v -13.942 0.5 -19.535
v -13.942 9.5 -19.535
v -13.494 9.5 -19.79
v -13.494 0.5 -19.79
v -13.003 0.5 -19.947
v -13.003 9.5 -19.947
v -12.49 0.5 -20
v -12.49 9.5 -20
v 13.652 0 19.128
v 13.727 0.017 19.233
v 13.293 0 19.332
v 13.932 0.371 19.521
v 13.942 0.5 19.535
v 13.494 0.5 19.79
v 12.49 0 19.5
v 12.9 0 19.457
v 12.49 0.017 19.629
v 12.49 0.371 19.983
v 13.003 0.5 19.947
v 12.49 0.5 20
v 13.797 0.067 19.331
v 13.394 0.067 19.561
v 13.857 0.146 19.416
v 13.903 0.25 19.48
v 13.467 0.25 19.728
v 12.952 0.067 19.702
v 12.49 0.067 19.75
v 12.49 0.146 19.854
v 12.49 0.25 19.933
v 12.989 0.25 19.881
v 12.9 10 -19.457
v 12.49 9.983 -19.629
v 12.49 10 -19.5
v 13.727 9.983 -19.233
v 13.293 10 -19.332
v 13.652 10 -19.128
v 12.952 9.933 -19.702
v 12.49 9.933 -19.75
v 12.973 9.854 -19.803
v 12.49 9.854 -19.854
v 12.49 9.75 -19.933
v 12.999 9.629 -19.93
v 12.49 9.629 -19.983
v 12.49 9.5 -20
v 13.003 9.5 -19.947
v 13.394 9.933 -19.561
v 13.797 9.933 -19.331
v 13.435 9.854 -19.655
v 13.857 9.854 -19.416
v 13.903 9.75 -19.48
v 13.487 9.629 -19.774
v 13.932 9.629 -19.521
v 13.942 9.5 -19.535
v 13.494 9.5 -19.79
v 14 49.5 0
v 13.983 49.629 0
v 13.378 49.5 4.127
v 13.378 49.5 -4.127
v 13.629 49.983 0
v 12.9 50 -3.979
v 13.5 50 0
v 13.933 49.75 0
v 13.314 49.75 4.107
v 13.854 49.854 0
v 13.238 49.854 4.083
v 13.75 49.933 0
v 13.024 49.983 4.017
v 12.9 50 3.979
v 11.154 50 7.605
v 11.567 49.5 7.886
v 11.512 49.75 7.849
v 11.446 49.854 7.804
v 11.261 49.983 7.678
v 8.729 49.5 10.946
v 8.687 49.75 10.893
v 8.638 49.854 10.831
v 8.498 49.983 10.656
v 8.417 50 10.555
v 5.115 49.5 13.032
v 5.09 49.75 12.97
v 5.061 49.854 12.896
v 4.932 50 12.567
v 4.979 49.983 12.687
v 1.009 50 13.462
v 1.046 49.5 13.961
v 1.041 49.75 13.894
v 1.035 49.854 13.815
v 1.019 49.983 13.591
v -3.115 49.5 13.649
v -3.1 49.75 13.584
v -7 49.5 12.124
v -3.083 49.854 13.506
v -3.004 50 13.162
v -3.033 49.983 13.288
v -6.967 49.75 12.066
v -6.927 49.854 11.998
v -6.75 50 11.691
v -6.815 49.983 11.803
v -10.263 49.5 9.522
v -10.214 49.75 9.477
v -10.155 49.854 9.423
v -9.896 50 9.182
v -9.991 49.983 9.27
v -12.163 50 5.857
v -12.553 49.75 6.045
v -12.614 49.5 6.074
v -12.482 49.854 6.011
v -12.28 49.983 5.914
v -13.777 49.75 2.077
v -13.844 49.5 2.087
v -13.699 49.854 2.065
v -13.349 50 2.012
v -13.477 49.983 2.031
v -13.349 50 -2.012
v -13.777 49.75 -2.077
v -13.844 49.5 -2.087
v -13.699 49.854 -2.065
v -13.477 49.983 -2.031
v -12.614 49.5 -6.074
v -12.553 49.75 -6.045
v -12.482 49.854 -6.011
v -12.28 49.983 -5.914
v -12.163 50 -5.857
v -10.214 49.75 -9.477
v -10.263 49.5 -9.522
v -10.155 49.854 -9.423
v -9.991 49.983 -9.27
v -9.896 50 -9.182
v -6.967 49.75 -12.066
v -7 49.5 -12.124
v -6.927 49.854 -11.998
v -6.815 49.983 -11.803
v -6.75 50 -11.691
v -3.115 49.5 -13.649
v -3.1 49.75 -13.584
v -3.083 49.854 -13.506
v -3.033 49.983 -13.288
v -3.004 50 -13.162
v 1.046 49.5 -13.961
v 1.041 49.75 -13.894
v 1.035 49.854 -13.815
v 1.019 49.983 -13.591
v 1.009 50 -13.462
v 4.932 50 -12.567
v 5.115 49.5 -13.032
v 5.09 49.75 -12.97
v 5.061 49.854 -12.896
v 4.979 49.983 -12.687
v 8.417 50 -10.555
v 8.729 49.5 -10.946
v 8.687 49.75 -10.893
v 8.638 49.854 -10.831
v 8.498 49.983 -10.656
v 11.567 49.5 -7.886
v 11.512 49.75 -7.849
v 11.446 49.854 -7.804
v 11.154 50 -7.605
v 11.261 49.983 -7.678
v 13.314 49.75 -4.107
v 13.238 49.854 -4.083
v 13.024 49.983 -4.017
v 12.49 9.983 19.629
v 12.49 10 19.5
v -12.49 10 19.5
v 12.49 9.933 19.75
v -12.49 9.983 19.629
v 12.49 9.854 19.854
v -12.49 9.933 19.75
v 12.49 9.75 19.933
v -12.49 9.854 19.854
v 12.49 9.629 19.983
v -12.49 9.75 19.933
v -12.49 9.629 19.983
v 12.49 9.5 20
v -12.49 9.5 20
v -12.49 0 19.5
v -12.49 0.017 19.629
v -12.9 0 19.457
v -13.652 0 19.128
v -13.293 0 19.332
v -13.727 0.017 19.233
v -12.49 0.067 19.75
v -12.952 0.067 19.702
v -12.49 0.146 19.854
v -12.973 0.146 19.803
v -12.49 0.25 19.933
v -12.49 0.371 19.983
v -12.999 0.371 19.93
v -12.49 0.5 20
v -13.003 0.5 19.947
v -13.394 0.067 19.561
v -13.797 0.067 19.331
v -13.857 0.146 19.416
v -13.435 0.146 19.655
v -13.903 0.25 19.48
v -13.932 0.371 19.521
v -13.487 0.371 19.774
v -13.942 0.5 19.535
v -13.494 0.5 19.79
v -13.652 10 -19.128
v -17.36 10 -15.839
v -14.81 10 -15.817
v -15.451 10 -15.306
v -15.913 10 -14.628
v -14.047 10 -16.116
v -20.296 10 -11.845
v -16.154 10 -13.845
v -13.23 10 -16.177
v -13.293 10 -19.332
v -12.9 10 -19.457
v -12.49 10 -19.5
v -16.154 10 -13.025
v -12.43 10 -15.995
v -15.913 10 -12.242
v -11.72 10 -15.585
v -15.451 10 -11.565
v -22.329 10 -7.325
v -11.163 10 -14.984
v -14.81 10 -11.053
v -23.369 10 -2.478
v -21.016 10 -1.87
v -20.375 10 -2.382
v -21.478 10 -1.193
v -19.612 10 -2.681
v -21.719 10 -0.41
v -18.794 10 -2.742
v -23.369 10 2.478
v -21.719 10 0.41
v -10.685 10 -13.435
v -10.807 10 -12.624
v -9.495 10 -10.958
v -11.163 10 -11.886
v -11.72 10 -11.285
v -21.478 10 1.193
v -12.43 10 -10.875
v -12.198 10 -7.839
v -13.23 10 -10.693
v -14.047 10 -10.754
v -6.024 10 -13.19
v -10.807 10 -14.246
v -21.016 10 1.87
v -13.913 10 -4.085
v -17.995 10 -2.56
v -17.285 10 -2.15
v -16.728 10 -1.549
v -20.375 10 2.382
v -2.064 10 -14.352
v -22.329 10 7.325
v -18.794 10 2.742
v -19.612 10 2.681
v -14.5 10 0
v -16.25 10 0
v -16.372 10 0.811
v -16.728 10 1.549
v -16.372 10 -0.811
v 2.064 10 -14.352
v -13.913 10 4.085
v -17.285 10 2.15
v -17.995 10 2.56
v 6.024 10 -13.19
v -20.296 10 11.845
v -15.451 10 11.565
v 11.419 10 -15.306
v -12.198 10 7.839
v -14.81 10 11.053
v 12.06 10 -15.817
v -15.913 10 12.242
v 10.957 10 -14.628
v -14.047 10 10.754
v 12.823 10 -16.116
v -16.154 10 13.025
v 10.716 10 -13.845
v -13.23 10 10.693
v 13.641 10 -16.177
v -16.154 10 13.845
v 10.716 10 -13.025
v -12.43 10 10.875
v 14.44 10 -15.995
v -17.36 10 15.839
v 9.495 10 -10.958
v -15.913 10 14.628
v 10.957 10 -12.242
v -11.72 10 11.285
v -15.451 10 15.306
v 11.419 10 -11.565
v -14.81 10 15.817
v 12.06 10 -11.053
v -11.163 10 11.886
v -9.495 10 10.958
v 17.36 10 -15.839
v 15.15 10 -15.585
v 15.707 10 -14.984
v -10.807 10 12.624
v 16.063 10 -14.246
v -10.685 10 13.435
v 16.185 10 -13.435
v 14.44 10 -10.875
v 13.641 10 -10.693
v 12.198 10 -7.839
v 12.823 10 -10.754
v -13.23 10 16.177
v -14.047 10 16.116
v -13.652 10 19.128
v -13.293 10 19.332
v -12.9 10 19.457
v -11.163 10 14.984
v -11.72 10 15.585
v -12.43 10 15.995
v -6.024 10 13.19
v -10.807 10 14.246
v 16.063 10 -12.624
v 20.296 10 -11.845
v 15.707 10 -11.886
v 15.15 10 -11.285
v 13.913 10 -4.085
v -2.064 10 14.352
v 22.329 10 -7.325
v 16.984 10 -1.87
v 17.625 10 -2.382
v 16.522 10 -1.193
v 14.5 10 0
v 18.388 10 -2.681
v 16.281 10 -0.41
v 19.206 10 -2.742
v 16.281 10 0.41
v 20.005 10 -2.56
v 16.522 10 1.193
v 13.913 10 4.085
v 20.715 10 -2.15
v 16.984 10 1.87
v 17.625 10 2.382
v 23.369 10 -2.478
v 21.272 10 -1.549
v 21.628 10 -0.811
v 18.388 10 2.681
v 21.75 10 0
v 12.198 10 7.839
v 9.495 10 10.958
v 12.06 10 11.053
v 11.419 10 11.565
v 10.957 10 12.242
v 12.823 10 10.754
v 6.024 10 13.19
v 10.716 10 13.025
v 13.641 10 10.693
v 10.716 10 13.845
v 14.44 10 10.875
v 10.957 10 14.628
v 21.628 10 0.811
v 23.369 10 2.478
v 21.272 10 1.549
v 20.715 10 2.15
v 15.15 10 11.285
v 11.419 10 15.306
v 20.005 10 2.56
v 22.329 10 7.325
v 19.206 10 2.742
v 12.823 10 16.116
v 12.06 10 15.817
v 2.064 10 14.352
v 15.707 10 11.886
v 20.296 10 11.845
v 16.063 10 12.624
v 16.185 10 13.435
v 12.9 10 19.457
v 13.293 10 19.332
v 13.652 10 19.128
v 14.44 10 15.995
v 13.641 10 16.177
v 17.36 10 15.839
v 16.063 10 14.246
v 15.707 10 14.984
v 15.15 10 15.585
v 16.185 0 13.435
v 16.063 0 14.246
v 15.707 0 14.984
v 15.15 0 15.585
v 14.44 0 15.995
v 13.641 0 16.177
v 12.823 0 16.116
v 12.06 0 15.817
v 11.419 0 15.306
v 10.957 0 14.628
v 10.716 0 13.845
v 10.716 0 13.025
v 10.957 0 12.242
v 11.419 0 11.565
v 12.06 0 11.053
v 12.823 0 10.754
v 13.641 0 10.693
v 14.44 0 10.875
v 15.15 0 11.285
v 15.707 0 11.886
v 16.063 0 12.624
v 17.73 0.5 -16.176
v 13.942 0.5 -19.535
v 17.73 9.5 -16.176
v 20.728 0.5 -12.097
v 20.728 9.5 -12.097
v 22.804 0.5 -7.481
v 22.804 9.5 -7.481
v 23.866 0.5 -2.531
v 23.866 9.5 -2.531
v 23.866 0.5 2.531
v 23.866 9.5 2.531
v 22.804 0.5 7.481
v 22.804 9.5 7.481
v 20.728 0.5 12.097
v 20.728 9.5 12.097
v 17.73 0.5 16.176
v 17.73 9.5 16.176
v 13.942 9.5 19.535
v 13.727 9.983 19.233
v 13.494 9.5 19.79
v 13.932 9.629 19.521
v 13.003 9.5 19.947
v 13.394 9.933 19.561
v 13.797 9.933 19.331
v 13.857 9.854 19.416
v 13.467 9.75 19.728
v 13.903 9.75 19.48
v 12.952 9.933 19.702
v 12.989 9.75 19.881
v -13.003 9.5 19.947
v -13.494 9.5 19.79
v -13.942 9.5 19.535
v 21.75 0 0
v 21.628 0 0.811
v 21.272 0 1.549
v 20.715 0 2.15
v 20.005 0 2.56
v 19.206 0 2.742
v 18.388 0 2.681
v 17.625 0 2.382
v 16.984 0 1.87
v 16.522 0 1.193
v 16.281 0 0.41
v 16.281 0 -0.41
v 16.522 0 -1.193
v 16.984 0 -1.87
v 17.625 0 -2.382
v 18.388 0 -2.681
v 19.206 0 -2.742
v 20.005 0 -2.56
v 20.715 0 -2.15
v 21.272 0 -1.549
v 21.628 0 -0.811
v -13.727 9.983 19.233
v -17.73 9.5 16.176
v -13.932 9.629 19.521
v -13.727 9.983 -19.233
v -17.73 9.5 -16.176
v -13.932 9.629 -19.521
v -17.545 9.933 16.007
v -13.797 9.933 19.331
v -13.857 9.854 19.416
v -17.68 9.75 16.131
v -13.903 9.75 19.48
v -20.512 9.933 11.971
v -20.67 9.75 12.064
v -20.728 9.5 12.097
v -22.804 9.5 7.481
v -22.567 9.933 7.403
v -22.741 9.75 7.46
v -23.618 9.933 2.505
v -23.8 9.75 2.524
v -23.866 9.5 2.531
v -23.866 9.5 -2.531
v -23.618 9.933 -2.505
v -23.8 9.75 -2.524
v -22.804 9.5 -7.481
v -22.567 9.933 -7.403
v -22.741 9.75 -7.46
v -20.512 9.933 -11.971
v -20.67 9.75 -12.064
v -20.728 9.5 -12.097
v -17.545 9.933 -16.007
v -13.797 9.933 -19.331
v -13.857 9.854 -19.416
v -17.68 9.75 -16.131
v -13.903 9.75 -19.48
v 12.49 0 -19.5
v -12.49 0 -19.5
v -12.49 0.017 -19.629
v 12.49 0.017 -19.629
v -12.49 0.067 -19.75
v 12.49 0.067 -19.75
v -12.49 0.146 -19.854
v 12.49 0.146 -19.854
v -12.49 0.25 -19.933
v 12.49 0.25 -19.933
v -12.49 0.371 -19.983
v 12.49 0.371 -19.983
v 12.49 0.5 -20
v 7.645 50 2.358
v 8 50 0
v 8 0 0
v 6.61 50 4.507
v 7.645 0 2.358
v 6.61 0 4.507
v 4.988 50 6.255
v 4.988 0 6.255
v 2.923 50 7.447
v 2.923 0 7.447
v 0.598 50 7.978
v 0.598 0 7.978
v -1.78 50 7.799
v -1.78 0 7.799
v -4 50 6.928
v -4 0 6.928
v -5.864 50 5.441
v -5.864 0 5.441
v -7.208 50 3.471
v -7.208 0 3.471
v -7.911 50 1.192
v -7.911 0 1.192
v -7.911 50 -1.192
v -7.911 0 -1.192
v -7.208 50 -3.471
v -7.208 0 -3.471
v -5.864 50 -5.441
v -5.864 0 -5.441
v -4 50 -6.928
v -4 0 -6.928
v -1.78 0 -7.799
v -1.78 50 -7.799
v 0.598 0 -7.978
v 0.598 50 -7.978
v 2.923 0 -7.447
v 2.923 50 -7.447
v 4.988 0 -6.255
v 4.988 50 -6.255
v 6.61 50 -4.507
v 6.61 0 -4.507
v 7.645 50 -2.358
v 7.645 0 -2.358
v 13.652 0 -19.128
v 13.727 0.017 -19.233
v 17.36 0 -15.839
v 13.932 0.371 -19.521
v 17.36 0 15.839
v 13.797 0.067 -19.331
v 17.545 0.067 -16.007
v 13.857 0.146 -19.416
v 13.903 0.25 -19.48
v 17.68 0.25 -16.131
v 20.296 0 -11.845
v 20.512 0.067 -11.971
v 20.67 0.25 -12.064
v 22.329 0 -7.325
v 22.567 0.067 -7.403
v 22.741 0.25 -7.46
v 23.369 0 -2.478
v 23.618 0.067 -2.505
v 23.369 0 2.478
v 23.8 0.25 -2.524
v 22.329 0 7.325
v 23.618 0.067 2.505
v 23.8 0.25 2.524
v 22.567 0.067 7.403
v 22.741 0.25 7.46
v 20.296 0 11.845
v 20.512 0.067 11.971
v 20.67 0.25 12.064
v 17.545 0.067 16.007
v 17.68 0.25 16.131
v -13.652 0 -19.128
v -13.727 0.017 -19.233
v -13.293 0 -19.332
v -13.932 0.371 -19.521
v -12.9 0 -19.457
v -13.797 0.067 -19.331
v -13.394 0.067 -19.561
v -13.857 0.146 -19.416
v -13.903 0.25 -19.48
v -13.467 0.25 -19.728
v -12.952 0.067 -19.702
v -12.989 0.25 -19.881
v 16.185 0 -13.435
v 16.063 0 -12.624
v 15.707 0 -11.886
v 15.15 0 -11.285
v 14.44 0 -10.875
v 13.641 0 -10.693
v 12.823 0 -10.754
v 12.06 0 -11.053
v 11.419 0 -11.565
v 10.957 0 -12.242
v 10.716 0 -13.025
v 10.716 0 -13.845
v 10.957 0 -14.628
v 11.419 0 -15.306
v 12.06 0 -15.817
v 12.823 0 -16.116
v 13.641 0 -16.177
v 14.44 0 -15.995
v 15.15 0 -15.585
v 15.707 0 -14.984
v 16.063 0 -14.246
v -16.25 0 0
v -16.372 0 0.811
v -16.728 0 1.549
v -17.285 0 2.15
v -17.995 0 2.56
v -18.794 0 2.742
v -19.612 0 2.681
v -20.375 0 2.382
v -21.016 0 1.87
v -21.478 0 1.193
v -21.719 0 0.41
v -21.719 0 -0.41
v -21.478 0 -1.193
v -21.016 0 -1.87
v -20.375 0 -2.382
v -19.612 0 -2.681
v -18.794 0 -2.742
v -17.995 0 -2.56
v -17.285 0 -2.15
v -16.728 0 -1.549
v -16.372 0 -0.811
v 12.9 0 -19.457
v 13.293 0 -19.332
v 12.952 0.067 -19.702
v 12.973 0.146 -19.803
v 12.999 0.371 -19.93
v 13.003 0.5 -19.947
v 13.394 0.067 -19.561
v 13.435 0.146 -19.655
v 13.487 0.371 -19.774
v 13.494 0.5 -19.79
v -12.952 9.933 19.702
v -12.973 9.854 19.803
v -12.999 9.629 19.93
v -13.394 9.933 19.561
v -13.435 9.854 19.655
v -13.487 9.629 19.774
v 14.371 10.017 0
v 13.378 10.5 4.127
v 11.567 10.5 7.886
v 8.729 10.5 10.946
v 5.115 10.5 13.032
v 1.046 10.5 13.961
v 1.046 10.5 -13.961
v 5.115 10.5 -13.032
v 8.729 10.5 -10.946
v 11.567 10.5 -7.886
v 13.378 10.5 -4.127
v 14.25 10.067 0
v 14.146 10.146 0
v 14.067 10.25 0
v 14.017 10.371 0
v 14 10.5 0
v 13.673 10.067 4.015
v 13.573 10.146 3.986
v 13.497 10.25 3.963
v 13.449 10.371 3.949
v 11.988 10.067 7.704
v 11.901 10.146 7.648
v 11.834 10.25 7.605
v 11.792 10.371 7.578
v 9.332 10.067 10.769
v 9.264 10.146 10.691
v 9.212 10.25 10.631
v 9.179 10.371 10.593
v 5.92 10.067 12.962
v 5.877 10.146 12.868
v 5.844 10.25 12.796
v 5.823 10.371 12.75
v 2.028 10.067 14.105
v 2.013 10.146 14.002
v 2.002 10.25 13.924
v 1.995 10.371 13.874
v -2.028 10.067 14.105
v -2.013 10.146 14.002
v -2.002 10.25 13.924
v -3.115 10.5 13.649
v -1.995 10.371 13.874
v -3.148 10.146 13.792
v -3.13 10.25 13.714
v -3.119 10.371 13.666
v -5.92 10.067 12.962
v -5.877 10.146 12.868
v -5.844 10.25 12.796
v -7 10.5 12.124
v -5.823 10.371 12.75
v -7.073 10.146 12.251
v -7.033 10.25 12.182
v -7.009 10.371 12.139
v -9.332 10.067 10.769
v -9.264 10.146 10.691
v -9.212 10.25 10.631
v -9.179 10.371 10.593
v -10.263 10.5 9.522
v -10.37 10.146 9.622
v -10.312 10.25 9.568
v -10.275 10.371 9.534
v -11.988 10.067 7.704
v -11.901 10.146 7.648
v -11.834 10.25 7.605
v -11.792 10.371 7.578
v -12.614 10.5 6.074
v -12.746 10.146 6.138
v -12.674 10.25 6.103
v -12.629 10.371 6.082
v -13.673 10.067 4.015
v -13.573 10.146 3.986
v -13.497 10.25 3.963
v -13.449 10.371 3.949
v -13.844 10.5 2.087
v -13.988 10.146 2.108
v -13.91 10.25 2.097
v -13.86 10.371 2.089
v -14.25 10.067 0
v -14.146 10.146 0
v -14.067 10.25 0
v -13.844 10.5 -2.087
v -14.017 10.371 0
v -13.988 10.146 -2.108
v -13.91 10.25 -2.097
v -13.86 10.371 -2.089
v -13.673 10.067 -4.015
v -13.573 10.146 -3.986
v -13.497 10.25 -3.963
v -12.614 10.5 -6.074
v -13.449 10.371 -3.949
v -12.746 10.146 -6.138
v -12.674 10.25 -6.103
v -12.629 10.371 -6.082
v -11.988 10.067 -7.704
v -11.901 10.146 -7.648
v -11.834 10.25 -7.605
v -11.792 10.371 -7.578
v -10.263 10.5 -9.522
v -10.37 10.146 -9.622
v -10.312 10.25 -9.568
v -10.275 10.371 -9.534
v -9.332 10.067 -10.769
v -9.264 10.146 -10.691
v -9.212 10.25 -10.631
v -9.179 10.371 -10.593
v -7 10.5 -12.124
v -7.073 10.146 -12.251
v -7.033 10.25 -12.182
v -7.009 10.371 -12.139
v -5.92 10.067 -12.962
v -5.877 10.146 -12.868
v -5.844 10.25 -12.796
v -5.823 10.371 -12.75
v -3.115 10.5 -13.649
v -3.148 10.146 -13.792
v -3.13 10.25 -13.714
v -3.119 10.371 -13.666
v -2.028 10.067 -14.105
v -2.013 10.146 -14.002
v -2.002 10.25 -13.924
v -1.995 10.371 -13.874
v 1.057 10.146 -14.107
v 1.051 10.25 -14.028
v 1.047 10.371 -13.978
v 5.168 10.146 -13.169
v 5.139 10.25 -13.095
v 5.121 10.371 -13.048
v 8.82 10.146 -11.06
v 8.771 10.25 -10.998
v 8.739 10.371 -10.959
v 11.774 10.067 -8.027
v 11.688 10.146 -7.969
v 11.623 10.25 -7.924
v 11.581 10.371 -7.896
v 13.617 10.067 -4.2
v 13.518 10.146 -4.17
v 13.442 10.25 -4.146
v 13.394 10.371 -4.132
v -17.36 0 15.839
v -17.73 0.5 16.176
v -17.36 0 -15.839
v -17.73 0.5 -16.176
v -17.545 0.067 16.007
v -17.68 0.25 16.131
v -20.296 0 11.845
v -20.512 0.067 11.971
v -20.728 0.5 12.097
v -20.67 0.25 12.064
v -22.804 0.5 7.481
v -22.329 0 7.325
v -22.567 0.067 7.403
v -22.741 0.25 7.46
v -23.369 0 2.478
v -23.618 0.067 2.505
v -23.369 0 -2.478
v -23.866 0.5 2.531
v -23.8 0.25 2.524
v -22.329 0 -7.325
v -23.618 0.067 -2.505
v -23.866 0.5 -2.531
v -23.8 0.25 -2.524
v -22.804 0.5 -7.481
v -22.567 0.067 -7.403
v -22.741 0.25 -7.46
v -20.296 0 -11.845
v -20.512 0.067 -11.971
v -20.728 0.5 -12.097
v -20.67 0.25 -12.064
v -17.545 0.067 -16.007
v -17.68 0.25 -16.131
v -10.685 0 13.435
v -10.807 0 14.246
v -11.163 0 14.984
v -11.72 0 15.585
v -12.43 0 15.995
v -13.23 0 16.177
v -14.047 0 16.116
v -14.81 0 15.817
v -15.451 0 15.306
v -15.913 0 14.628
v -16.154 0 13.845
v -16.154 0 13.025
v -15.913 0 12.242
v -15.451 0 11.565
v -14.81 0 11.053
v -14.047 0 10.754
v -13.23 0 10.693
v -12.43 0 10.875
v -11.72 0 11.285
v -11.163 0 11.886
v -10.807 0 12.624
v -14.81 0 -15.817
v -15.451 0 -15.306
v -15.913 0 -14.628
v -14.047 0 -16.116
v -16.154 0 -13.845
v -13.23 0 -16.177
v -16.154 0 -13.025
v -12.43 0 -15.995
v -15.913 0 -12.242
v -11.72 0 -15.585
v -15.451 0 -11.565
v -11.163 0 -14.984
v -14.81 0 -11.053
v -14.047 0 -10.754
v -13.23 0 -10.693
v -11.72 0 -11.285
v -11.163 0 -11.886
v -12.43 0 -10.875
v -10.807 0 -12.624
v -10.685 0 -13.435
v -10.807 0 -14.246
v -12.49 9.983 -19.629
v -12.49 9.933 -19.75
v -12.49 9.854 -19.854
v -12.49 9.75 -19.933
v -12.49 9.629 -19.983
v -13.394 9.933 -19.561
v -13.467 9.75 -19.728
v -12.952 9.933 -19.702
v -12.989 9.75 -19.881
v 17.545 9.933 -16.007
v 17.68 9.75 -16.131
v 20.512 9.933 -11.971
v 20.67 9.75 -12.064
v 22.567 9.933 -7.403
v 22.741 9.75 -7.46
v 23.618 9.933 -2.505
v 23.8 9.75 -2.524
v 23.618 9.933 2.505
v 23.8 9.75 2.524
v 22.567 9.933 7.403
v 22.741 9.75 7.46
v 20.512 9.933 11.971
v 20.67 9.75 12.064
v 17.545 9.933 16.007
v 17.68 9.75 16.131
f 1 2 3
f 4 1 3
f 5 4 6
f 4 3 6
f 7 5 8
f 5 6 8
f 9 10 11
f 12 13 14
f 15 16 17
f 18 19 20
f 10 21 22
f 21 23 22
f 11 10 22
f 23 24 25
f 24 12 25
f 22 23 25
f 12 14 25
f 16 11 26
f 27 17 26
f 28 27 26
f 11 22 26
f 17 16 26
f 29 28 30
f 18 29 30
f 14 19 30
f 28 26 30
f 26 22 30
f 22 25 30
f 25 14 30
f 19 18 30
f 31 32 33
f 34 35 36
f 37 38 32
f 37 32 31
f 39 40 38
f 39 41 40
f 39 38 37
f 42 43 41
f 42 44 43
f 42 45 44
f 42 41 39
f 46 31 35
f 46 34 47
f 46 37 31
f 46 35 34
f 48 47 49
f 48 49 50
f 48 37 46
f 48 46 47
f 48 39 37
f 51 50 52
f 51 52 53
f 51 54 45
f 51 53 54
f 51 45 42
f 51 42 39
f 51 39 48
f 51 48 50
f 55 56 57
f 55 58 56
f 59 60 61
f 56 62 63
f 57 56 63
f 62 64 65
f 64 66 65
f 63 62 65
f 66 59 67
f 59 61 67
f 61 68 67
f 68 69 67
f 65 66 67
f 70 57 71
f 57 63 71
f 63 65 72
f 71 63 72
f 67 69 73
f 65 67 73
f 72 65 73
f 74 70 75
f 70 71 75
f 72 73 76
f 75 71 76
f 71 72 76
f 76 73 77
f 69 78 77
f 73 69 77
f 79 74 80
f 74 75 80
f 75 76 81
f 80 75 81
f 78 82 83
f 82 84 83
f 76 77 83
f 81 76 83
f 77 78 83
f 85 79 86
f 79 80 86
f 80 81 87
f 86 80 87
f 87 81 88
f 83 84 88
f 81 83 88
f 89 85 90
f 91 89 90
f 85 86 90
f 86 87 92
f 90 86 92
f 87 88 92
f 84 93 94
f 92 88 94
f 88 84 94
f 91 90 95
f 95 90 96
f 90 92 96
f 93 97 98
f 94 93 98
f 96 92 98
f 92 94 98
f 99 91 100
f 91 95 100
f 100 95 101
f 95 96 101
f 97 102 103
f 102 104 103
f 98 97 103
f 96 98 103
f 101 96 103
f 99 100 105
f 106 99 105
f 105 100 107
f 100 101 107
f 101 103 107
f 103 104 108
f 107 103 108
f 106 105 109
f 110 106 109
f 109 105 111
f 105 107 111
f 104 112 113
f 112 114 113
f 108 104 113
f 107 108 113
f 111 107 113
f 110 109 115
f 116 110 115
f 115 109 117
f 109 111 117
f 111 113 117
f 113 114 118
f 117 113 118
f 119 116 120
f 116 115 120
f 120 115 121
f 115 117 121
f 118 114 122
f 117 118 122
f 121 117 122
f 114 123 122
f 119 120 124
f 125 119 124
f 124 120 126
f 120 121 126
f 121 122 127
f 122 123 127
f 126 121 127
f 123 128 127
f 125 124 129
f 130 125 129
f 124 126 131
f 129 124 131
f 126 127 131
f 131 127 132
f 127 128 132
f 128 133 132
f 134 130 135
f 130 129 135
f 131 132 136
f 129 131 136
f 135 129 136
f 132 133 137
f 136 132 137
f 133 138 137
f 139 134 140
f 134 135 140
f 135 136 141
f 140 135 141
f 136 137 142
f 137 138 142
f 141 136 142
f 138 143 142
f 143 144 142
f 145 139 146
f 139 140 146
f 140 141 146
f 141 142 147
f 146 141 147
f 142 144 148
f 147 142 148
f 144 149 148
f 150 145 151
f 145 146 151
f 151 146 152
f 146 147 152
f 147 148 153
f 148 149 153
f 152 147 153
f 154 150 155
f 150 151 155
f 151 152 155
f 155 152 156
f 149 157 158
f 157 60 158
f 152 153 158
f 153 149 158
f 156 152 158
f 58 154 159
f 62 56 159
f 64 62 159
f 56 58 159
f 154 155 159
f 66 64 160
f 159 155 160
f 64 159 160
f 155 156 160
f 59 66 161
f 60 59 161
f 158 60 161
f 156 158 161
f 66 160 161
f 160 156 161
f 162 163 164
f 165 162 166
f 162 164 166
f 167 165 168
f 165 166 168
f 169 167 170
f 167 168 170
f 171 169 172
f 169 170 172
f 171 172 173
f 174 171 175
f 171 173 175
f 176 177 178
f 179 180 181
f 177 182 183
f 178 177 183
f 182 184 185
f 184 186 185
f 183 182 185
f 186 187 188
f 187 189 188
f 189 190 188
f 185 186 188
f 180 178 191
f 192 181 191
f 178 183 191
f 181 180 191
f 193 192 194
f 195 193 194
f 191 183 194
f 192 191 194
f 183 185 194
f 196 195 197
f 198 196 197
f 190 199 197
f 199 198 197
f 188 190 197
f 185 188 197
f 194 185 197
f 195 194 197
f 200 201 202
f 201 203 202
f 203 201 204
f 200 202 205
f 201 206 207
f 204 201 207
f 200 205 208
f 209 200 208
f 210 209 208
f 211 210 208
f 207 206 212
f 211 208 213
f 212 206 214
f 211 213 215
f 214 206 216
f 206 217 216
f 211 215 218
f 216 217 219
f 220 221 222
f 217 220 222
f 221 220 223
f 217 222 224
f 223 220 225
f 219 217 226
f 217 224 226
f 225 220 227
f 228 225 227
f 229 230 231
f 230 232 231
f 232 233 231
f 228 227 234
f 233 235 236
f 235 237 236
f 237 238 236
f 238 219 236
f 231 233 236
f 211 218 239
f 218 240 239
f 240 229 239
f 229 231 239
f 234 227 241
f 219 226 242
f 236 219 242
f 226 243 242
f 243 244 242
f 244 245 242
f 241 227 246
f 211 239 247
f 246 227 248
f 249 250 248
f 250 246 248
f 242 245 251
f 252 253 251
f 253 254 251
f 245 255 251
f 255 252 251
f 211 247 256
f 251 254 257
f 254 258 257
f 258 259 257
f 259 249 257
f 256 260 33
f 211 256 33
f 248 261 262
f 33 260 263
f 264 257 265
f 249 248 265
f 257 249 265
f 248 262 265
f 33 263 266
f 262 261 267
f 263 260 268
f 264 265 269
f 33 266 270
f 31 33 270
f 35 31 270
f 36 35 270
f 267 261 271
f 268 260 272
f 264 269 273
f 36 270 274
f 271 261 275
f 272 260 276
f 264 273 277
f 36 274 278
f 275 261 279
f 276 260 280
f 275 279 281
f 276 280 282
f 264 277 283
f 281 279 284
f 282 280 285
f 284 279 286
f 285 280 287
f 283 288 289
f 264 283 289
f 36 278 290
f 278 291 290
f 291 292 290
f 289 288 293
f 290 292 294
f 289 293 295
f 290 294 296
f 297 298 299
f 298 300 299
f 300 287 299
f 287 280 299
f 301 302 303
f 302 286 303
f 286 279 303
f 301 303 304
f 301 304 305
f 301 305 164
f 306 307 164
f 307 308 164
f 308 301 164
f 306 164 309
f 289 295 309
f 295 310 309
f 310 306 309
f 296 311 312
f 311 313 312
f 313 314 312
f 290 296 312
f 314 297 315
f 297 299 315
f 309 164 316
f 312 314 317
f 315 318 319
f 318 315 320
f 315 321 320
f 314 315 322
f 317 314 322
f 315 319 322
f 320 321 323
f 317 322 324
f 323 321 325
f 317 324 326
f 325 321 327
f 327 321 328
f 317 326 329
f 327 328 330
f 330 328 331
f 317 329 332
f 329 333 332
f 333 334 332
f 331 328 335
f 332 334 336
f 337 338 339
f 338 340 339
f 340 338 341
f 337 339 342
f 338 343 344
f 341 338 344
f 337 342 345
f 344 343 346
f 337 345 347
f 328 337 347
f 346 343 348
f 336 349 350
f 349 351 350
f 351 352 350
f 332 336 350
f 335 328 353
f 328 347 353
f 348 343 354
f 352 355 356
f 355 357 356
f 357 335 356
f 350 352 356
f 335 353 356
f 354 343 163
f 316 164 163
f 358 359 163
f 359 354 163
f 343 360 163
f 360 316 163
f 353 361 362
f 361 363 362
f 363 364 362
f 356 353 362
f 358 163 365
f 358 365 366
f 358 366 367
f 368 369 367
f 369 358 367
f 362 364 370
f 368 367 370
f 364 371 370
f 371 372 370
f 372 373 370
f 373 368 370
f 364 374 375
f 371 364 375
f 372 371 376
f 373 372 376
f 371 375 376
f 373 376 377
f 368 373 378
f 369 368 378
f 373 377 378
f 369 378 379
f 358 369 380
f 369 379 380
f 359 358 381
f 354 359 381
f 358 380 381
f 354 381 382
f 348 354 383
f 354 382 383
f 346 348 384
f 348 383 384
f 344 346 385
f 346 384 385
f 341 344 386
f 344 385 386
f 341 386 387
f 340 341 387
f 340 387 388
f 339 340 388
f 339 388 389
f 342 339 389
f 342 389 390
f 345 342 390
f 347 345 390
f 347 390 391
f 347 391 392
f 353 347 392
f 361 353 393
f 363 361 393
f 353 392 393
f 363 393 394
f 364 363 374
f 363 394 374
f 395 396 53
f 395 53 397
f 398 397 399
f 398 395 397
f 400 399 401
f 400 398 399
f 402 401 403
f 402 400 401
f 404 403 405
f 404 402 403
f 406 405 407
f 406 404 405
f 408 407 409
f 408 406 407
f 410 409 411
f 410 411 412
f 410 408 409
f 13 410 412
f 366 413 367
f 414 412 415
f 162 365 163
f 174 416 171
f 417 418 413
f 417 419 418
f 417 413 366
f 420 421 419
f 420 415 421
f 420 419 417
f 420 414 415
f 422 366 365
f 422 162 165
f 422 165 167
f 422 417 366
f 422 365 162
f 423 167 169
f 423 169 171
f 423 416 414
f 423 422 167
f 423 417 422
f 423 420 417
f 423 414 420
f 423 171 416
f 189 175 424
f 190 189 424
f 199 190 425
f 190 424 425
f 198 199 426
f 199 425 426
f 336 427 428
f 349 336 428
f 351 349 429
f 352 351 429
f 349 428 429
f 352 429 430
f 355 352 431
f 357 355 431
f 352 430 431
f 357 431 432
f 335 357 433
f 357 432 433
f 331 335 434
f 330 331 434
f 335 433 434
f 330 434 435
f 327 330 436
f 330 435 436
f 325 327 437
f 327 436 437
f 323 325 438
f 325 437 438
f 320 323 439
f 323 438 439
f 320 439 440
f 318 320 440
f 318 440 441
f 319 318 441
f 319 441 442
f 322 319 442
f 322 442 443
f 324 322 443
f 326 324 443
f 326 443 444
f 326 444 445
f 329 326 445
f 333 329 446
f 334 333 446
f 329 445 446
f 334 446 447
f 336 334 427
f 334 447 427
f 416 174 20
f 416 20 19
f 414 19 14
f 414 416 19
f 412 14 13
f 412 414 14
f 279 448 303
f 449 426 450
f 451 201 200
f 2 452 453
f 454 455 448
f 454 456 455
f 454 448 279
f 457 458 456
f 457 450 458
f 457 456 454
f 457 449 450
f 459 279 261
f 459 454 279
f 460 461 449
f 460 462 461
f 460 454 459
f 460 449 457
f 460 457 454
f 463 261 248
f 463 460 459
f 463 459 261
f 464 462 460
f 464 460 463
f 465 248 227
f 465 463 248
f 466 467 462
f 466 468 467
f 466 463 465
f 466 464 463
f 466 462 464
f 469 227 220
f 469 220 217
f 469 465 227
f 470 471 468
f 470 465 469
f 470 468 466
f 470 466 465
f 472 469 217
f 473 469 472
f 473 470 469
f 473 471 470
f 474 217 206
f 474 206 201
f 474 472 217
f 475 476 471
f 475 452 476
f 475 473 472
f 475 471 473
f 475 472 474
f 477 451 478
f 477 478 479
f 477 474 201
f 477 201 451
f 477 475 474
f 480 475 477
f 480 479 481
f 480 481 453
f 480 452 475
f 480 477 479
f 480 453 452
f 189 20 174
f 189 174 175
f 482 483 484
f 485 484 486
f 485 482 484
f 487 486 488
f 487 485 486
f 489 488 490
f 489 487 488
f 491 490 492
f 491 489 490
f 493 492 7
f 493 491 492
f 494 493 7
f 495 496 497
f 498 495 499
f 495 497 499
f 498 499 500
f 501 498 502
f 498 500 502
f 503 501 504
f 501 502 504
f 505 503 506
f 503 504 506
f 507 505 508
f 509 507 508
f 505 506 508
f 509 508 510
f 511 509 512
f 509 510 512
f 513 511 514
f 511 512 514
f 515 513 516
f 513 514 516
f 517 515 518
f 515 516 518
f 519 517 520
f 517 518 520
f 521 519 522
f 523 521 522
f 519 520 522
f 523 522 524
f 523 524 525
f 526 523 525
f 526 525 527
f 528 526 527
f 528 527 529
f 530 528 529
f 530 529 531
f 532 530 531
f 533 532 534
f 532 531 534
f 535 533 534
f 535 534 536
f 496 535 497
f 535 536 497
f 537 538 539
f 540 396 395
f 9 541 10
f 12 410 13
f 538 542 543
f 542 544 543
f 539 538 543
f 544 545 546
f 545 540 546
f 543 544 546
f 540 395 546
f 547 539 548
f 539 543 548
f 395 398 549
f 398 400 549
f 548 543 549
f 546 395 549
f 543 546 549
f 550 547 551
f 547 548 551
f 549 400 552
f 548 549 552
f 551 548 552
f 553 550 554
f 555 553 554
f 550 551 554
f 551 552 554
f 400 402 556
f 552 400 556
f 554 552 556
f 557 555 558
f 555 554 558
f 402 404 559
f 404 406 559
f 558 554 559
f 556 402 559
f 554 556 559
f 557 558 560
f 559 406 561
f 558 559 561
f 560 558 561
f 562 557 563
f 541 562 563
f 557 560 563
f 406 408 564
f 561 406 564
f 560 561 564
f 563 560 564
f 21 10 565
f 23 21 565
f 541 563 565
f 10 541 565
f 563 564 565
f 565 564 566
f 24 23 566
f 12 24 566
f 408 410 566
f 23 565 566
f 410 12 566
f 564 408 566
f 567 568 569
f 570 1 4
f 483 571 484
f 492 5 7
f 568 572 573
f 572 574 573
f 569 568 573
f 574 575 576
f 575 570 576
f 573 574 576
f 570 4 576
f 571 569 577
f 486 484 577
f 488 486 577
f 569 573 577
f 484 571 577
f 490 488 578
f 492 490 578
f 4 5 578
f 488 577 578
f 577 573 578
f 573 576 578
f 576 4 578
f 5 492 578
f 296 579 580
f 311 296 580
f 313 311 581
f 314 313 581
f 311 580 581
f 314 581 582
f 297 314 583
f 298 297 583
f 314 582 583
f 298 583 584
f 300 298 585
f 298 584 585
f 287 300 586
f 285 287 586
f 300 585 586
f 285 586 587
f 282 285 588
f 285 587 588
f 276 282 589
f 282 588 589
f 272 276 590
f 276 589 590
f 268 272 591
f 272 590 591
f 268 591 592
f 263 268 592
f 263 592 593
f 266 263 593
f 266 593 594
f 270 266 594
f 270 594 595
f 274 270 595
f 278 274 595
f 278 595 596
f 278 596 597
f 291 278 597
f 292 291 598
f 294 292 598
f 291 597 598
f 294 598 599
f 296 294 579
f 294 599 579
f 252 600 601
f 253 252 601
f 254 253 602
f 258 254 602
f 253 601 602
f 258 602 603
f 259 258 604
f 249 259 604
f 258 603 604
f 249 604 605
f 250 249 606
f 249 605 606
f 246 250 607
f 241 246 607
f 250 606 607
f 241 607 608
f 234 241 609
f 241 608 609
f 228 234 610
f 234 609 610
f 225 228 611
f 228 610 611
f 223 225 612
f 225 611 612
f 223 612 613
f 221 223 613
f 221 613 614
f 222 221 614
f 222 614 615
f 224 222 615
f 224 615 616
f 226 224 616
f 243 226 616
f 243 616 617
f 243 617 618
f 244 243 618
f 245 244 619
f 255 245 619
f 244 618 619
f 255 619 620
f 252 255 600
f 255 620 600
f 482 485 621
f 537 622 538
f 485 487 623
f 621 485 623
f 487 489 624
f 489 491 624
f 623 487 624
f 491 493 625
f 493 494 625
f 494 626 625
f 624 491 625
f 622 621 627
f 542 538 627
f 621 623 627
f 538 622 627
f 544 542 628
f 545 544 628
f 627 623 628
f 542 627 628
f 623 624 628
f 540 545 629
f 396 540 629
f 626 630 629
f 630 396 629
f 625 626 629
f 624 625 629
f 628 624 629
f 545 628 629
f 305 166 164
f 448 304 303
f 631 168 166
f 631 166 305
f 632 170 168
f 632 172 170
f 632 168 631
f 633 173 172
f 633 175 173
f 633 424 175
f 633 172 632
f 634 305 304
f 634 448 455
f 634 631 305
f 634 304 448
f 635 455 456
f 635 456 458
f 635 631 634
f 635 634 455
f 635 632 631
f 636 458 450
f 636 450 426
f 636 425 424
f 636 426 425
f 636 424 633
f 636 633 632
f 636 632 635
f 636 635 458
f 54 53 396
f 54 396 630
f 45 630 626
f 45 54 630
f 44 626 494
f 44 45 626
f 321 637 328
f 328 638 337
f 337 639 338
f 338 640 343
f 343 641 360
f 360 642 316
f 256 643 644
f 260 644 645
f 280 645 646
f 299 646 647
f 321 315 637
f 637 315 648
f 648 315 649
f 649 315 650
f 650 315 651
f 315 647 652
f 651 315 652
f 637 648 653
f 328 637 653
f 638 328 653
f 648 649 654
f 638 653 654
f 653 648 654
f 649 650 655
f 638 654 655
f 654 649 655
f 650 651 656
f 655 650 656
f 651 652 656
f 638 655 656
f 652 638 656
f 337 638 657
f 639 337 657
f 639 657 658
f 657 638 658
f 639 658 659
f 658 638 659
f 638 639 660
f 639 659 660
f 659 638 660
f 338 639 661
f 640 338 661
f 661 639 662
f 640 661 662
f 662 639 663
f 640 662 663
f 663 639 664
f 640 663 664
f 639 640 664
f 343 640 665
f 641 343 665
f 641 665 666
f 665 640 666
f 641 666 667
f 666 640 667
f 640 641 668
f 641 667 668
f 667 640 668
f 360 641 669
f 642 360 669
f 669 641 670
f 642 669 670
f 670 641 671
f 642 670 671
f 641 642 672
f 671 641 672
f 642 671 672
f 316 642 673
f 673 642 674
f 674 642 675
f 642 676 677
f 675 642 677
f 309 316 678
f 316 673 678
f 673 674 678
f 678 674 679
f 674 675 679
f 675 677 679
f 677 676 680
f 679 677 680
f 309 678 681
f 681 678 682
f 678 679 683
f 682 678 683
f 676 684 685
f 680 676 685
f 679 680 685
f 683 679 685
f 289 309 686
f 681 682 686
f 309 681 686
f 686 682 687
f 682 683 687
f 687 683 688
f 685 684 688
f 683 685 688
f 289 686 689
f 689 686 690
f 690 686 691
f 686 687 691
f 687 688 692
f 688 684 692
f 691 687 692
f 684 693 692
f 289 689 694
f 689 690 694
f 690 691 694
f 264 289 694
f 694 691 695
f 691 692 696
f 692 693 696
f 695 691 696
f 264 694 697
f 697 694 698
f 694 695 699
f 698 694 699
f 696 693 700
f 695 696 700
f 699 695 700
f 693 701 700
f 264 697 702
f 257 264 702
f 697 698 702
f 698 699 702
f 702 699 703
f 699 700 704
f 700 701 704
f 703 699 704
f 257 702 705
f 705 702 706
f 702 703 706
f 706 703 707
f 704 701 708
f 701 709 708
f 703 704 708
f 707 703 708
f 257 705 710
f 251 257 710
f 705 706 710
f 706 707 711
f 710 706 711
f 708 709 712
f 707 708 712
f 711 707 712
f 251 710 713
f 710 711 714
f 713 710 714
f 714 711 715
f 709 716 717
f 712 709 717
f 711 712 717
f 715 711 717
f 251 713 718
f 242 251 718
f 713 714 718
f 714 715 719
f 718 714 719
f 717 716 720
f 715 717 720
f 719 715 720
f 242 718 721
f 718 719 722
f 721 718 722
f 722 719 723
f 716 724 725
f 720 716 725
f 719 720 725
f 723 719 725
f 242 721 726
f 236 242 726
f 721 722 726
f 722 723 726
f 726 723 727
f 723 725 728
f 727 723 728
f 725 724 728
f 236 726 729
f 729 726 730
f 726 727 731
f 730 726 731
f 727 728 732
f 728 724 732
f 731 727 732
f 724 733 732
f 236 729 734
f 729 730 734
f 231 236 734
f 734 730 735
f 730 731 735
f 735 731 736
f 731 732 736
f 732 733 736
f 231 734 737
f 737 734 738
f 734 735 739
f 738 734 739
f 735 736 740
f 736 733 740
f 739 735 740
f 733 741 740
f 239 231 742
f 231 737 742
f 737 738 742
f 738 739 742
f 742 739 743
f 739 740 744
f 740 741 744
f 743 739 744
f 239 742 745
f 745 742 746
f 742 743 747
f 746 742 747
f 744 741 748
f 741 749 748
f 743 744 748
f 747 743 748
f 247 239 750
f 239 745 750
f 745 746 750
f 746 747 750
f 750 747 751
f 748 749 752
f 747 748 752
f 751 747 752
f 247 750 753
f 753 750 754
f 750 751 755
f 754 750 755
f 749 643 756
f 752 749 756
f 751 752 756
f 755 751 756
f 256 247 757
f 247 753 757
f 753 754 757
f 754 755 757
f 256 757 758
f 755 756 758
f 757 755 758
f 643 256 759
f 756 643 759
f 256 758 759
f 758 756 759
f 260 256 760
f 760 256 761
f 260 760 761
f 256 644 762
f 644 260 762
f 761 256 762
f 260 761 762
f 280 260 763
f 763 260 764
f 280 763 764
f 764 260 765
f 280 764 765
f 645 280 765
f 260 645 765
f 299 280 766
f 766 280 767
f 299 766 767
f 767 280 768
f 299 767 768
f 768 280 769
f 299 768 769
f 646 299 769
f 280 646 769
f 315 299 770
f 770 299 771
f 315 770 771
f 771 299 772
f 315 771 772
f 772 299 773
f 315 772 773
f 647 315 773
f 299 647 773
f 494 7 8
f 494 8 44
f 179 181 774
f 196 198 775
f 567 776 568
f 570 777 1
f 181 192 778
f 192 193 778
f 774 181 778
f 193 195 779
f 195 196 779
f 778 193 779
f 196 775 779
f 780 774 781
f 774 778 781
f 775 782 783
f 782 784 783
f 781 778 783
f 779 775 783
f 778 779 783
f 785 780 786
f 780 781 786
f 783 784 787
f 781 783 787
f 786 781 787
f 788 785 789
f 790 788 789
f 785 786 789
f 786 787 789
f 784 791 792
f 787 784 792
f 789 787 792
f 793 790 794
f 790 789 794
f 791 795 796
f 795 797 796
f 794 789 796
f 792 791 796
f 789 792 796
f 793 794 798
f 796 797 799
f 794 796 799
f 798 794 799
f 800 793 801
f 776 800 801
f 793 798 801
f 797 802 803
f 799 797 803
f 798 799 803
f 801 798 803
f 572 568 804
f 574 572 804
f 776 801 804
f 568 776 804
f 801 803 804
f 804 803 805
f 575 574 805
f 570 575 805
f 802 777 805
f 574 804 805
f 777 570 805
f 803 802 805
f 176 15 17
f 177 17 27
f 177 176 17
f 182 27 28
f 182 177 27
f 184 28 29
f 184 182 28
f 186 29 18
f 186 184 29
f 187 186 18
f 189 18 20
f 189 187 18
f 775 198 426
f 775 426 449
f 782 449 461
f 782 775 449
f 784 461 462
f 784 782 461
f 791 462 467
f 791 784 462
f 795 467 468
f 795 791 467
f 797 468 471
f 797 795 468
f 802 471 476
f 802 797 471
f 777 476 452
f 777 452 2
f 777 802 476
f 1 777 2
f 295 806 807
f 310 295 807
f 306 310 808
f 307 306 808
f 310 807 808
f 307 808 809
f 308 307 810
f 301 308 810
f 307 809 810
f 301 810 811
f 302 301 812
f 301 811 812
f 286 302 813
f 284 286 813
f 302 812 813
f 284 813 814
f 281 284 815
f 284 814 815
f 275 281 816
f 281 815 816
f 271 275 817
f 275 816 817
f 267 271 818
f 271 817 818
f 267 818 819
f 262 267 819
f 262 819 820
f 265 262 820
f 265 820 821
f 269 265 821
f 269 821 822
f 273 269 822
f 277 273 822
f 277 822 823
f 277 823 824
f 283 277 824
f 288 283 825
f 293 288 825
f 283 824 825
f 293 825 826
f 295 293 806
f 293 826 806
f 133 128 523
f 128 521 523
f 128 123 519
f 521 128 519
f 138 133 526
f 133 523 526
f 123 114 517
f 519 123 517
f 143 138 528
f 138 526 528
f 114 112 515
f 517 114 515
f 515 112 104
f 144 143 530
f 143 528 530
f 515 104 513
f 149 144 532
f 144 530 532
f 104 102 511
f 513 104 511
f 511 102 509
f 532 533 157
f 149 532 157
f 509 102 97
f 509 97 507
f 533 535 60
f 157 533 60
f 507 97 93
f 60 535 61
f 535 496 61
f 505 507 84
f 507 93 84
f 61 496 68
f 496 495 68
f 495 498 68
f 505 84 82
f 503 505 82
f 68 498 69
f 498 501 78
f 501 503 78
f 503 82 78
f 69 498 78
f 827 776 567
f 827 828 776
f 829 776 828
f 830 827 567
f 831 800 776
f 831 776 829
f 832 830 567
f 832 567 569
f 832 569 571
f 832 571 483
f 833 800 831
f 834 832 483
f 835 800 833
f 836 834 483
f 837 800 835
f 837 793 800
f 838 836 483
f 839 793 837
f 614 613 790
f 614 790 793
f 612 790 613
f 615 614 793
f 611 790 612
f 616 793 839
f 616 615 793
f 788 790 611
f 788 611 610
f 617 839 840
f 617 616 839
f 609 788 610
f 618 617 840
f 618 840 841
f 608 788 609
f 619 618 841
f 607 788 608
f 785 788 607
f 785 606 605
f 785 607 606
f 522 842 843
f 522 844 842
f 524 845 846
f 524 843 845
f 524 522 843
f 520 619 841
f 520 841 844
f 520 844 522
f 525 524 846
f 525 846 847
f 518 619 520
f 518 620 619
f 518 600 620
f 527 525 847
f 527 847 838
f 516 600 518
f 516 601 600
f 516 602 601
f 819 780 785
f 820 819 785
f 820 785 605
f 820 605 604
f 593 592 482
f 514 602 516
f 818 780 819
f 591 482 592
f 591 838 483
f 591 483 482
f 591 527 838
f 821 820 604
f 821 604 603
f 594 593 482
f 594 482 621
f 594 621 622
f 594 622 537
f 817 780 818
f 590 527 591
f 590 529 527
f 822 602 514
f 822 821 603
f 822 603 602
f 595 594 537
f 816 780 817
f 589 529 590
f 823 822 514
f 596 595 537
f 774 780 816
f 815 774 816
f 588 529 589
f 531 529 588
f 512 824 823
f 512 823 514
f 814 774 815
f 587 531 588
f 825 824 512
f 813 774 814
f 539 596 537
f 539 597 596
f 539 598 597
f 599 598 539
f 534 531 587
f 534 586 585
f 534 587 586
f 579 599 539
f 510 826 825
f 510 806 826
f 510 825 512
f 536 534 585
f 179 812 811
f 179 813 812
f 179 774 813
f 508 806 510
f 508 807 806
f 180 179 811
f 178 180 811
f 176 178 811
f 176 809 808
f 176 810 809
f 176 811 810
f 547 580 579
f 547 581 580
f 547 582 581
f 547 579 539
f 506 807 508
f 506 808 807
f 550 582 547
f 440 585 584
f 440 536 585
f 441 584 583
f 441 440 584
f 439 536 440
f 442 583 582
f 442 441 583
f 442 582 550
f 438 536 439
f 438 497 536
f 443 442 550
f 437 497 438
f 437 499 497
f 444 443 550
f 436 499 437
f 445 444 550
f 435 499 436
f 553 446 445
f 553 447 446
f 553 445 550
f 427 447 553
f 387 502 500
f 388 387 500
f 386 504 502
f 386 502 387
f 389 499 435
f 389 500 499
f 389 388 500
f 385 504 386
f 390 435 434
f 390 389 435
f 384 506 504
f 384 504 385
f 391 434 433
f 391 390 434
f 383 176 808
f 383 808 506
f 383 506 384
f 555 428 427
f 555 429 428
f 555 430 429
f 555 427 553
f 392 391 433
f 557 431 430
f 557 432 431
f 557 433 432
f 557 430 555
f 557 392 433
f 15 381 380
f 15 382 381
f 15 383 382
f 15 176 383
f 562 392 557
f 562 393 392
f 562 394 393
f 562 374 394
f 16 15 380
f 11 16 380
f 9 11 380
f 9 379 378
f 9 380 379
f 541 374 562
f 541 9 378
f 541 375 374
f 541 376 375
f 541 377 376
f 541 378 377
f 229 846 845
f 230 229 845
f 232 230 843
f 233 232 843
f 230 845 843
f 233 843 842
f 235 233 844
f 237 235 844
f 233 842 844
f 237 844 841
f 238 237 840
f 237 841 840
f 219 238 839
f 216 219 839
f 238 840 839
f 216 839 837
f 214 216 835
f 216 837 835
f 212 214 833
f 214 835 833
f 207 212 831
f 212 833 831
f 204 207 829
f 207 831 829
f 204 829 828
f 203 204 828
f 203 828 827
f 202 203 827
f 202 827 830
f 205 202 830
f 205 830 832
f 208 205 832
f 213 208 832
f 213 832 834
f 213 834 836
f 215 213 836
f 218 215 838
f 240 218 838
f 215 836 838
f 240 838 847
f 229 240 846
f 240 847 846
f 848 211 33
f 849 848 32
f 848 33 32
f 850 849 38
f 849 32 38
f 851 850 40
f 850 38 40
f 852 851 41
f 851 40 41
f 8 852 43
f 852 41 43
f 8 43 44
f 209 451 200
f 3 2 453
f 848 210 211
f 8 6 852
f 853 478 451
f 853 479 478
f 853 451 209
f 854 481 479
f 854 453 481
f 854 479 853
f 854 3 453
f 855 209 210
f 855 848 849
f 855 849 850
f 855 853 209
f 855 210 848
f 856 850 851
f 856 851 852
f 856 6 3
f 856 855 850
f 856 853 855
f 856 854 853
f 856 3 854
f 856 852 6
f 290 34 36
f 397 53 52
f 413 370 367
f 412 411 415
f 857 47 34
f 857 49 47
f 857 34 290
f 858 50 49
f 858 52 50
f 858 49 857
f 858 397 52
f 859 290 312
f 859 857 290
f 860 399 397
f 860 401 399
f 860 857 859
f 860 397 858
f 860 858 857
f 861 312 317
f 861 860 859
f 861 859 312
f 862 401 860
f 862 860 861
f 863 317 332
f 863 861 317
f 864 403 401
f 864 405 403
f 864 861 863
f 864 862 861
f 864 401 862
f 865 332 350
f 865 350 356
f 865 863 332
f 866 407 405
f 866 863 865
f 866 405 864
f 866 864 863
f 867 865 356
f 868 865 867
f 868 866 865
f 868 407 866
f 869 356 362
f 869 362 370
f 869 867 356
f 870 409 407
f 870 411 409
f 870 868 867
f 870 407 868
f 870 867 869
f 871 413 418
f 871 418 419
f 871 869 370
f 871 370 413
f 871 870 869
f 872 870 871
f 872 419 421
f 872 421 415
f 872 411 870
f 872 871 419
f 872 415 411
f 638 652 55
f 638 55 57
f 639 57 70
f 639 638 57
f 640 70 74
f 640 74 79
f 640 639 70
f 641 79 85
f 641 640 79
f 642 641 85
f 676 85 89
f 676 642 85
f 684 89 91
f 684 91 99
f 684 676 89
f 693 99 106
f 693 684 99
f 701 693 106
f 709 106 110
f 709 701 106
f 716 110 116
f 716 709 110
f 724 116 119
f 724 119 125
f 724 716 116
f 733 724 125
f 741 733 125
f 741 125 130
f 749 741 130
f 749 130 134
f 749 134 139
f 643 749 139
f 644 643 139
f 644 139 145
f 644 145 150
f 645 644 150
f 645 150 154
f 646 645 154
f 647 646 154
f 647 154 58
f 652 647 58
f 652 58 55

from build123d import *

# Parameters (mm, degrees)
F1_R     = 14
F1_R_2   = 8
F2_DEPTH = 50
F1_R_3   = 2.75
F3_DEPTH = 10
F4_R     = 2.5
F5_R     = 0.5


with BuildPart() as f2:
    # F1 (on Front) → F2 (new body)
    with BuildSketch(Plane.XZ):
        Circle(F1_R)
        Circle(F1_R_2, mode=Mode.SUBTRACT)
    extrude(amount=-F2_DEPTH)

    # F1 (on Front) → F3 (join)
    with BuildSketch(Plane.XZ):
        with BuildLine():
            Line((13.266499, 20), (-13.266499, 20))
            ThreePointArc((-13.266499, 20), (-24, 0), (-13.266499, -20))
            Line((-13.266499, -20), (13.266499, -20))
            ThreePointArc((13.266499, -20), (24, 0), (13.266499, 20))
        make_face()
        with Locations((-13.435029, -13.435029)):
            Circle(F1_R_3, mode=Mode.SUBTRACT)
        with Locations((-19, 0)):
            Circle(F1_R_3, mode=Mode.SUBTRACT)
        with Locations((13.435029, -13.435029)):
            Circle(F1_R_3, mode=Mode.SUBTRACT)
        Circle(F1_R, mode=Mode.SUBTRACT)
        with Locations((19, 0)):
            Circle(F1_R_3, mode=Mode.SUBTRACT)
        with Locations((-13.435029, 13.435029)):
            Circle(F1_R_3, mode=Mode.SUBTRACT)
        with Locations((13.435029, 13.435029)):
            Circle(F1_R_3, mode=Mode.SUBTRACT)
    extrude(amount=-F3_DEPTH)

    # F4
    f4_edges = [f2.edges().sort_by_distance(p)[0] for p in [
        (-13.266499, 5, 20),
        (-13.266499, 5, -20),
        (13.266499, 5, 20),
        (13.266499, 5, -20),
    ]]
    fillet(f4_edges, radius=F4_R)

    # F5
    f5_edges = [f2.edges().sort_by_distance(p)[0] for p in [
        (24, 10, 0),
        (24, 0, 0),
        (-14, 10, 0),
        (-14, 50, 0),
    ]]
    fillet(f5_edges, radius=F5_R)


solid = f2.part
